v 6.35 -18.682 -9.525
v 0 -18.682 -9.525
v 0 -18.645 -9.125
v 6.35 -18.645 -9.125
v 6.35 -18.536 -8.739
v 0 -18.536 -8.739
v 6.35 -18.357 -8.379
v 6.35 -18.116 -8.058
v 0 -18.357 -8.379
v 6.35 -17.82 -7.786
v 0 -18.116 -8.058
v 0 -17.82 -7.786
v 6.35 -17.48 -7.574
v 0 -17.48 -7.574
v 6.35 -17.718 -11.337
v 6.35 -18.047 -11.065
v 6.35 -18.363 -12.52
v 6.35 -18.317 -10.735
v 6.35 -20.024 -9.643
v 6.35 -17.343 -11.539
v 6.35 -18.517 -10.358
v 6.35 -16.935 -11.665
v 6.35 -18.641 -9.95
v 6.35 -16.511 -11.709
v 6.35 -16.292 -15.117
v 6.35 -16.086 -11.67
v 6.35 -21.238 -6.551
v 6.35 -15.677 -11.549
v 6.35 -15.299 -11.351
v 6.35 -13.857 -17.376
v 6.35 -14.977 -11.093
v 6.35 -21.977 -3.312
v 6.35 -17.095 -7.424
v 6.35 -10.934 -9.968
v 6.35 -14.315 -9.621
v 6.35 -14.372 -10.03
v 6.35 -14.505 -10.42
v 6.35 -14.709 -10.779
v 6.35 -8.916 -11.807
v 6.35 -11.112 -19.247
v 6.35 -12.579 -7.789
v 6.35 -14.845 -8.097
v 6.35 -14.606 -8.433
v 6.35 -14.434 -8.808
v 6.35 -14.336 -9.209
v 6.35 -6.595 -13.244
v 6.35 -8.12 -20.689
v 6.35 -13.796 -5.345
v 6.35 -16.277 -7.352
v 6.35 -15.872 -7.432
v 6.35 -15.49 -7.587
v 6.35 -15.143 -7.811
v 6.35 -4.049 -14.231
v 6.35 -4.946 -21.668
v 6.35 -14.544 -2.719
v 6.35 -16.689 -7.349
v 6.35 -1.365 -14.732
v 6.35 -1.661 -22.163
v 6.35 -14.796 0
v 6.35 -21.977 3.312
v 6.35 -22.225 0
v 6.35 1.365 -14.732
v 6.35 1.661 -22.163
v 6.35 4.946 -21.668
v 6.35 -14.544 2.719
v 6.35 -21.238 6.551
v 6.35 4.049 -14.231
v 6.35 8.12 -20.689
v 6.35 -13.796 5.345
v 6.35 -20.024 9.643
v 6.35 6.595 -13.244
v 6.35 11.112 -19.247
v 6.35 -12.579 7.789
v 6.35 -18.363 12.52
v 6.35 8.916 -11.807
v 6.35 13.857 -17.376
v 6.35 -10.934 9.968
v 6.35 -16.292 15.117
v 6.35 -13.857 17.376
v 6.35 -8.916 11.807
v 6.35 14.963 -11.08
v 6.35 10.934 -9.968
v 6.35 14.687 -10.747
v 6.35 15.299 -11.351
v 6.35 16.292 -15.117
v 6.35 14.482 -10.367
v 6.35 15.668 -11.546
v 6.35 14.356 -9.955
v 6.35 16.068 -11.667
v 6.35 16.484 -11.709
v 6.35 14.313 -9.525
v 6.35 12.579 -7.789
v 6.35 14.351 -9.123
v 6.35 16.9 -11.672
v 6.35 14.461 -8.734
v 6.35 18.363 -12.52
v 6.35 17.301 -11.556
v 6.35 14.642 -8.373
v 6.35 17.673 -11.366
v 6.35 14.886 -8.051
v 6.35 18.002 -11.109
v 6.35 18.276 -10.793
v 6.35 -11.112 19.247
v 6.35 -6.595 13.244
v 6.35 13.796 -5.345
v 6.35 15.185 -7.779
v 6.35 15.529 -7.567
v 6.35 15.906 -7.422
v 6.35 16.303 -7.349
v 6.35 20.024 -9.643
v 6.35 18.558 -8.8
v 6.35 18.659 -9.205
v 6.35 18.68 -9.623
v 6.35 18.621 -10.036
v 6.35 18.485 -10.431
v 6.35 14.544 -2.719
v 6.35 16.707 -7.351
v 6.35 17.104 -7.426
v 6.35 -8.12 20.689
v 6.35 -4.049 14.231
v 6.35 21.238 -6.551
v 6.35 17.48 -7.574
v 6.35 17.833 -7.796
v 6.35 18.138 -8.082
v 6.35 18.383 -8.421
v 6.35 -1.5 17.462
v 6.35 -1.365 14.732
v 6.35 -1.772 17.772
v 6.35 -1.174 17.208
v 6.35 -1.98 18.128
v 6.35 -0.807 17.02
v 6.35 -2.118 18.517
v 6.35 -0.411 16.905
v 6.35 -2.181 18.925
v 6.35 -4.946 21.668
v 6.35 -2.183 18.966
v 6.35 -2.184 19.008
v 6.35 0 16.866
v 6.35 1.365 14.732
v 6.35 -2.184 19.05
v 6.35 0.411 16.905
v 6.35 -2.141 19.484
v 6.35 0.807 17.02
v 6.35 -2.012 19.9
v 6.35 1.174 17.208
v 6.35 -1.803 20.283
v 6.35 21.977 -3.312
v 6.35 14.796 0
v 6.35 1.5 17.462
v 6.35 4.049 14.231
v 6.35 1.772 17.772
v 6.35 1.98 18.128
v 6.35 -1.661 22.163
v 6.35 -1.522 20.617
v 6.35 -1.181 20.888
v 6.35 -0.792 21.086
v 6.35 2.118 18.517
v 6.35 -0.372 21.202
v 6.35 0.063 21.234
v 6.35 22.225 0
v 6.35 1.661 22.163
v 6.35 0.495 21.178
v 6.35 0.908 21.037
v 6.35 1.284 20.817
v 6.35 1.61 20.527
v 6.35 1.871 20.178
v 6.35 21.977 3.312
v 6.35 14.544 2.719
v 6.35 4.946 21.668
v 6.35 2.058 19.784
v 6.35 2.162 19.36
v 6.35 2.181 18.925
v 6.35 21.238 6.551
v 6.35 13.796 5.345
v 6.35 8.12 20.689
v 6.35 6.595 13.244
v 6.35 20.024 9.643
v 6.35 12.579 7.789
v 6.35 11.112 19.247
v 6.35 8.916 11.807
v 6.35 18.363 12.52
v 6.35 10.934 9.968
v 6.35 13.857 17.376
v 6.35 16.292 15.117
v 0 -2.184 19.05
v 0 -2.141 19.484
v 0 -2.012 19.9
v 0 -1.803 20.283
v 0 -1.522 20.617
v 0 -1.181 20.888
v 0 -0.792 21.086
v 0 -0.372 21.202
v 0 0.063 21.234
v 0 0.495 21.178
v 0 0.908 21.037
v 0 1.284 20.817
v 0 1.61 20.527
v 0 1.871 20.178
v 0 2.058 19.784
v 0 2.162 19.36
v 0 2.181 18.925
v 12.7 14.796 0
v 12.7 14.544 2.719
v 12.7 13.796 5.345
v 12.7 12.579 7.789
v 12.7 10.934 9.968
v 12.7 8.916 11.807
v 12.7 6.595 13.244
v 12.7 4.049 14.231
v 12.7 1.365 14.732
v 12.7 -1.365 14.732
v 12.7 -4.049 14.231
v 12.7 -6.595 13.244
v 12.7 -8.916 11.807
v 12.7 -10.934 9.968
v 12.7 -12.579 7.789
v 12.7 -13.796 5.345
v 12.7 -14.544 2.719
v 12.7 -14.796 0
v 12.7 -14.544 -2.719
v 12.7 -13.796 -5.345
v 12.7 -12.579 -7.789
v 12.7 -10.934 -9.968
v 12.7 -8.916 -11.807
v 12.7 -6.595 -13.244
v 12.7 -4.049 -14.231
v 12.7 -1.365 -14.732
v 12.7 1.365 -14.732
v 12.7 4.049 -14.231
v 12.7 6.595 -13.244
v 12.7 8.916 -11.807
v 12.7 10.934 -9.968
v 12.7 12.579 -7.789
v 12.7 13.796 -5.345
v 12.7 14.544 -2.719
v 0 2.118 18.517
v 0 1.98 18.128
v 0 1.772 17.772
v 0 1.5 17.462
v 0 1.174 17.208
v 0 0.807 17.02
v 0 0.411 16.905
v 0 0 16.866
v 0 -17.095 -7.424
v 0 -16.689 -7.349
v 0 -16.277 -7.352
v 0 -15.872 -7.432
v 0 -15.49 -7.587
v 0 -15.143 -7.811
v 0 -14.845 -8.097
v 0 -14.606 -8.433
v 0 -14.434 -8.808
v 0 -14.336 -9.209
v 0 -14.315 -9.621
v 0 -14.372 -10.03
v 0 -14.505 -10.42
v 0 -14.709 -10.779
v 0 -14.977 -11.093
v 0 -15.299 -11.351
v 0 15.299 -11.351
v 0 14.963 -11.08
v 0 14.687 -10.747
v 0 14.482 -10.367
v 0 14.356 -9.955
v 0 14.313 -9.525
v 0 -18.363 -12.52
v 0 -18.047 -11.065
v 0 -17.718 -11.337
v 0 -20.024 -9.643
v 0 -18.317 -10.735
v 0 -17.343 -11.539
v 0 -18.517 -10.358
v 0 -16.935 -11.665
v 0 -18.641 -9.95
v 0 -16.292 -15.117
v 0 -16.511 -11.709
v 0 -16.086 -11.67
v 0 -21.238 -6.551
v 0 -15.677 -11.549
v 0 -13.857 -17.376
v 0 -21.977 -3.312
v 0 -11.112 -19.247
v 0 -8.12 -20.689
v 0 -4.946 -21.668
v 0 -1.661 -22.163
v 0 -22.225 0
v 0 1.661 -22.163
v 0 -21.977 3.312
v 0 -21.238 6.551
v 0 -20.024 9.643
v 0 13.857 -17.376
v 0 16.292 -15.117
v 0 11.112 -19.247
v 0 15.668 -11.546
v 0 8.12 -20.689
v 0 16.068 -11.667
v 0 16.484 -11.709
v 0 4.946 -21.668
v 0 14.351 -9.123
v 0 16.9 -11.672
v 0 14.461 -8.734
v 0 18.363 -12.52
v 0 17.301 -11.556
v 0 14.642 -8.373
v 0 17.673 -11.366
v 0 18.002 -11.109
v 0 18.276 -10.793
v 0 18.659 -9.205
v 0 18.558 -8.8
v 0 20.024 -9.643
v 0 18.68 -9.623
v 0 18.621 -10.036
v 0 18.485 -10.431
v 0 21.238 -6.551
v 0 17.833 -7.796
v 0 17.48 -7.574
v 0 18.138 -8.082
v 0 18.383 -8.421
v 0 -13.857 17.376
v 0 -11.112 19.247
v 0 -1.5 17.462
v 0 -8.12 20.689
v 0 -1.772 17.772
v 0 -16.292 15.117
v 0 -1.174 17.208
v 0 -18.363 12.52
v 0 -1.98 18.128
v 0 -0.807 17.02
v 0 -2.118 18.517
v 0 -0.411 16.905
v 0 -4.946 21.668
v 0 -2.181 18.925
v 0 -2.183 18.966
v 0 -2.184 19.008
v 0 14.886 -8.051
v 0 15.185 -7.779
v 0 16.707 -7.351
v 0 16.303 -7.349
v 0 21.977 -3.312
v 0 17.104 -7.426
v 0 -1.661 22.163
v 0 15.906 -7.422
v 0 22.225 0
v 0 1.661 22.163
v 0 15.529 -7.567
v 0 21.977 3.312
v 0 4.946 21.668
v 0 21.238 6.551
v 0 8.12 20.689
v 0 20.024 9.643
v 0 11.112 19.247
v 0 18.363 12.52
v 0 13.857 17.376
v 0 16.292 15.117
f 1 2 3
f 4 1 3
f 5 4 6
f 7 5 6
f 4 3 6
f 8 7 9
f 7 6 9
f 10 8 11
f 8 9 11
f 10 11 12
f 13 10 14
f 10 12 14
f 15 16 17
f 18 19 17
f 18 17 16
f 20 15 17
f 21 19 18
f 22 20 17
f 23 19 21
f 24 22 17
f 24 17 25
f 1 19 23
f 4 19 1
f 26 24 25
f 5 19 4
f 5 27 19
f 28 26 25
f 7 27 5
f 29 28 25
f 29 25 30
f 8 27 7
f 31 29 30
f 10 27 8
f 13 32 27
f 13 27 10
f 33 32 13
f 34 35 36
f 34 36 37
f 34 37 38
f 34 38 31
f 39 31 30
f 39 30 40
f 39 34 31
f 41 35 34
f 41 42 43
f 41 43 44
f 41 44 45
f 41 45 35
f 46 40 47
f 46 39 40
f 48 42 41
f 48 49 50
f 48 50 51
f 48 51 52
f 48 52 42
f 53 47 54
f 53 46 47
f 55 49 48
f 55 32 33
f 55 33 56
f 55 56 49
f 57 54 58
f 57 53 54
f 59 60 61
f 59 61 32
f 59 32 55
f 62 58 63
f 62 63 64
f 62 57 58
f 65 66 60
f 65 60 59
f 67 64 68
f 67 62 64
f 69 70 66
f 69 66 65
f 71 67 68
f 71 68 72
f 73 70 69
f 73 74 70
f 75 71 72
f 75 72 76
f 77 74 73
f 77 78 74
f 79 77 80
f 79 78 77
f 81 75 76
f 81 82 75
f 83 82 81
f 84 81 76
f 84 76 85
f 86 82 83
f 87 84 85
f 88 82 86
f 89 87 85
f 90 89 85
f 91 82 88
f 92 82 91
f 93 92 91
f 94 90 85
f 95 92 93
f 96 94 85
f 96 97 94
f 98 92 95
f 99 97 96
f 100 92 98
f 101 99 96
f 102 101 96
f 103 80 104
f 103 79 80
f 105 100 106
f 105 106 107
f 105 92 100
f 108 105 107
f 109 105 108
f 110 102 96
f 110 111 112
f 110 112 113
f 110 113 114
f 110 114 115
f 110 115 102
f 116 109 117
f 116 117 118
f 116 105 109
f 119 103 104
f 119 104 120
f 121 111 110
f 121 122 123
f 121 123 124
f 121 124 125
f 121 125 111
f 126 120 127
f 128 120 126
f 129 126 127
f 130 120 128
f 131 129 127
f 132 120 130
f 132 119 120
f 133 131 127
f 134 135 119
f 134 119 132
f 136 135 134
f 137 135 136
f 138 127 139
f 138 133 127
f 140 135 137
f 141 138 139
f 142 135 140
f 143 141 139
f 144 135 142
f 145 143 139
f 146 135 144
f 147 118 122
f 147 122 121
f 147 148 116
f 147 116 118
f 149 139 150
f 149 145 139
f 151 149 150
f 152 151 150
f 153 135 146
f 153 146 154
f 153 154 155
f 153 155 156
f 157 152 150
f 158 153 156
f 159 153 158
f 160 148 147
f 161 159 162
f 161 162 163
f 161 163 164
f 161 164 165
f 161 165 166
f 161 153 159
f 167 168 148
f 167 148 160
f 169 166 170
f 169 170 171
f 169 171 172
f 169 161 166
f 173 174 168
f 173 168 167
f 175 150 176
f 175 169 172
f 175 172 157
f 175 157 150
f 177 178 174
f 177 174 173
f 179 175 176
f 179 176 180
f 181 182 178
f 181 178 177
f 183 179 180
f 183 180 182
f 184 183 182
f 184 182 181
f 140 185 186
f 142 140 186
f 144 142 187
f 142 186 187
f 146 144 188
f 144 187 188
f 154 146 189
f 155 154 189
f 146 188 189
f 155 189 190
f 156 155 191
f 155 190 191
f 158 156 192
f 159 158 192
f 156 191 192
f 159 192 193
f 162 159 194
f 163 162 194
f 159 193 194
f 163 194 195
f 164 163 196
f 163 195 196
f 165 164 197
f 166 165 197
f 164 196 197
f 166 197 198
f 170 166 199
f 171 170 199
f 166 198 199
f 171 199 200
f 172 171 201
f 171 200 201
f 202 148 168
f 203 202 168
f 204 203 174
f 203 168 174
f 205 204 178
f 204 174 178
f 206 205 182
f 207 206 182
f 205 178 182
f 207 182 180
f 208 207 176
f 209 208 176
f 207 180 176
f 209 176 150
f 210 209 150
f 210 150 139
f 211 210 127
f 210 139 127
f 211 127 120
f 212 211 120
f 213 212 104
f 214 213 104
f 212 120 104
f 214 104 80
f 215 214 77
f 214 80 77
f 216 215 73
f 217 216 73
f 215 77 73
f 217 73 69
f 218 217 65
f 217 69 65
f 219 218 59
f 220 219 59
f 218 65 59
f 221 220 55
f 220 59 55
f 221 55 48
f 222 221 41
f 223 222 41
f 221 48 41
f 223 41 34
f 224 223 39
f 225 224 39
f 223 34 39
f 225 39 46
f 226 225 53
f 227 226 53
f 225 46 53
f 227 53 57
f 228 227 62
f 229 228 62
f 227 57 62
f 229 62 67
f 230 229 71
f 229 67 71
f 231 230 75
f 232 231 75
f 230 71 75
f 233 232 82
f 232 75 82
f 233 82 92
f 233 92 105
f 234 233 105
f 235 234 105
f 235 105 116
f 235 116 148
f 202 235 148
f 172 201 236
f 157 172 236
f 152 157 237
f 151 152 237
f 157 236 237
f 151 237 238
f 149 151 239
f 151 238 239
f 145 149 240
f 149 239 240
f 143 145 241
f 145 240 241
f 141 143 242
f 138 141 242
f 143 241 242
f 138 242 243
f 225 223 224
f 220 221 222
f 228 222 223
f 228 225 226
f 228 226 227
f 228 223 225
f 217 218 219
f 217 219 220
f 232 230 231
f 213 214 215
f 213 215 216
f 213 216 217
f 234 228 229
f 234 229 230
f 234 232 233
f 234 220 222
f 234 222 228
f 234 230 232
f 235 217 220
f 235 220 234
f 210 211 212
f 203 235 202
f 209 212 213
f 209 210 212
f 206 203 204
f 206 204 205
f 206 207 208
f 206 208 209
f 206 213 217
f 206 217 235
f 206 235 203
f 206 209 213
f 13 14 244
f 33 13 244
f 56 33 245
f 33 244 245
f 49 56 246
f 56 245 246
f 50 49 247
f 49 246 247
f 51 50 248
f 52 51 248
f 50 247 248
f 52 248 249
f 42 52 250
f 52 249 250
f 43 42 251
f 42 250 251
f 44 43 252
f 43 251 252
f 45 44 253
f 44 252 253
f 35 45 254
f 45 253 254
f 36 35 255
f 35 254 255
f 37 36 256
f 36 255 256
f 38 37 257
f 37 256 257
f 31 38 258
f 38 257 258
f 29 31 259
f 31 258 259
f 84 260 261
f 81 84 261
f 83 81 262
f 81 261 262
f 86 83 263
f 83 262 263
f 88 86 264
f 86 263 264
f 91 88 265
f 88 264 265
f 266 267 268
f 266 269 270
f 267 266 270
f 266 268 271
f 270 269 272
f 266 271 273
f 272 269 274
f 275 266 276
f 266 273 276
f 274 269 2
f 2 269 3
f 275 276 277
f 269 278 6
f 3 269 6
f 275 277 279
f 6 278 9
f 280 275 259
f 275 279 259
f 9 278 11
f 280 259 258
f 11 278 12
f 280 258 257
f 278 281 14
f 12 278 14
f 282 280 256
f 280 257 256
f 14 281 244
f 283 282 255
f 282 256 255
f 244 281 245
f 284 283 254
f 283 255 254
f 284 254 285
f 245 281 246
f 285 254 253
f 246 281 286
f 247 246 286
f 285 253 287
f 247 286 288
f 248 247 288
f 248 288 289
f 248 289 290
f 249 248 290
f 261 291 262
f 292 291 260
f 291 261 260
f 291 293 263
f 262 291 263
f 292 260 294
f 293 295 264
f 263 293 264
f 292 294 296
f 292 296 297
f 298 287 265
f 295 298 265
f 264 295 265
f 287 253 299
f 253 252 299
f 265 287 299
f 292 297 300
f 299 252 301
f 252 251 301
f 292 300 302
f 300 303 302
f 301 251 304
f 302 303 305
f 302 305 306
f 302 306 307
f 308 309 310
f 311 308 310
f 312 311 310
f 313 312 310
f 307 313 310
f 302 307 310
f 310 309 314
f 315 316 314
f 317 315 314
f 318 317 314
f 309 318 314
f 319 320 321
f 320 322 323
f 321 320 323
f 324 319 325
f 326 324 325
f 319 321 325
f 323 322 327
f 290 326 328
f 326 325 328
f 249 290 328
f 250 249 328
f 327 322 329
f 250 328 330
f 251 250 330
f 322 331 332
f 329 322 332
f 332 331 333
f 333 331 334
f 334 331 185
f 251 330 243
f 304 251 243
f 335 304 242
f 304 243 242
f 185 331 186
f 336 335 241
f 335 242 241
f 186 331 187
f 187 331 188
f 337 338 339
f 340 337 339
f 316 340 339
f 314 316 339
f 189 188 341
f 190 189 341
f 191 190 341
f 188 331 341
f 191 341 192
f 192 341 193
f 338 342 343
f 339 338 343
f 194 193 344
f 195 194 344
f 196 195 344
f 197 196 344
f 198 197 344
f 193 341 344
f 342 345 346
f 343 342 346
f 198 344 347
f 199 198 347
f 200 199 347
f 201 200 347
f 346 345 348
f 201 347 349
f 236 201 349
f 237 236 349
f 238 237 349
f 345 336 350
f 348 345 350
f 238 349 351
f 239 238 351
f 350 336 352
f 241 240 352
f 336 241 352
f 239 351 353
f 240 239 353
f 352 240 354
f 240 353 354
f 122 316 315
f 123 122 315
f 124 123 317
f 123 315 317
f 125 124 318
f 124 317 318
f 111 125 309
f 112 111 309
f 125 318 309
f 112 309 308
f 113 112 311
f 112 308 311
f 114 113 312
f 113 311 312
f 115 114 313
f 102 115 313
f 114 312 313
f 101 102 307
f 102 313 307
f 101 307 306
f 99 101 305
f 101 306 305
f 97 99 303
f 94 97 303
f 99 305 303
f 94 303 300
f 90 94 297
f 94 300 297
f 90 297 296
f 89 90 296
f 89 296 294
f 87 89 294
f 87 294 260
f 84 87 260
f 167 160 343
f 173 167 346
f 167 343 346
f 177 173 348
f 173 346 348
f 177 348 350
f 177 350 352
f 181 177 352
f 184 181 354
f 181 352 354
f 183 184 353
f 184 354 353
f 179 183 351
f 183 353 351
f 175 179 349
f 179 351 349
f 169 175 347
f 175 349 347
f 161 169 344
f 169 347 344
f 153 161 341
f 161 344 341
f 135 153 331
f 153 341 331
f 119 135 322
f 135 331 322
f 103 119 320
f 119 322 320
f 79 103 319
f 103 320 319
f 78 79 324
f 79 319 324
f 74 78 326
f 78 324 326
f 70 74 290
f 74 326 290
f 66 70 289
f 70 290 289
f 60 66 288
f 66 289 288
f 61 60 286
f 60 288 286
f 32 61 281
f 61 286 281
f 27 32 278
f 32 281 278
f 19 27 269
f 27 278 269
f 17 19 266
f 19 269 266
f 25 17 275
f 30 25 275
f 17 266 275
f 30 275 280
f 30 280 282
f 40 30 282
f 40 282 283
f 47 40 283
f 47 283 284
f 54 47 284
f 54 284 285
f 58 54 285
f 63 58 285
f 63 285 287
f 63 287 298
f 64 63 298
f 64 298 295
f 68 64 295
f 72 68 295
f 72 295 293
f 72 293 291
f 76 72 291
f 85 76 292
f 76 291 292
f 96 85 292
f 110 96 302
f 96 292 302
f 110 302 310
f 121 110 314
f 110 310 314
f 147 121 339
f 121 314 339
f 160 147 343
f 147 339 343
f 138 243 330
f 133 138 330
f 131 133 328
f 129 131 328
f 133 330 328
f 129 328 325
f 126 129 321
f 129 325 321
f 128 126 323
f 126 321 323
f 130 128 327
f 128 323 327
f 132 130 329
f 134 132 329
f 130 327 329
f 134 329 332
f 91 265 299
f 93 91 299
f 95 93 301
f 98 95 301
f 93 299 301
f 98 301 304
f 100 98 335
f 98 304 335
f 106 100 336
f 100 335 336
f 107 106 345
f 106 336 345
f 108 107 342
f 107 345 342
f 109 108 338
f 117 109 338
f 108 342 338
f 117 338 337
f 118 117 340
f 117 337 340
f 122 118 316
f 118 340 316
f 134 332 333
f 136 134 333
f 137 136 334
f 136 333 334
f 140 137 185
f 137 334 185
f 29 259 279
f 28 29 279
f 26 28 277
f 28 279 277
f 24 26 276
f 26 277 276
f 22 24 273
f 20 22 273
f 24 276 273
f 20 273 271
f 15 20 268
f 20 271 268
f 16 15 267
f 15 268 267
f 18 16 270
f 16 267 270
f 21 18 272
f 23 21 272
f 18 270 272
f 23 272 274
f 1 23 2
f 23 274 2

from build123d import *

# Parameters (mm, degrees)
F0_R     = 22.225
F1_DEPTH = 6.35
F2_R     = 14.7955
F3_DEPTH = 6.35
F5_DEPTH = 25.4


with BuildPart() as f1:
    # F0 (on Right) → F1 (new body)
    with BuildSketch(Plane.YZ):
        Circle(F0_R)
    extrude(amount=F1_DEPTH)

    # F2 (on face) → F3 (join)
    with BuildSketch(Plane.YZ.offset(6.35)):
        Circle(F2_R)
    extrude(amount=F3_DEPTH)

    # F4 (on face) → F5 (cut)
    with BuildSketch(Plane(origin=(0, 0, 0), x_dir=(0, -1, 0), z_dir=(-1, 0, 0))):
        with BuildLine():
            ThreePointArc((-17.4797272753, -7.57374639), (-16.4977839421, -9.525), (-15.2989204133, -11.3510146766))
            ThreePointArc((-15.2989204133, -11.3510146766), (-14.5754935306, -10.5624984018), (-14.3133839421, -9.525))
            ThreePointArc((-14.3133839421, -9.525), (-15.3517808132, -7.6653548219), (-17.4797272753, -7.57374639))
        make_face()
        with BuildLine():
            ThreePointArc((-17.4797272753, -7.57374639), (-18.3895298341, -10.6172), (-15.2989204133, -11.3510146766))
            ThreePointArc((-15.2989204133, -11.3510146766), (-16.4977839421, -9.525), (-17.4797272753, -7.57374639))
        make_face()
        with BuildLine():
            ThreePointArc((15.2989204133, -11.3510146766), (16.4977839421, -9.525), (17.4797272753, -7.57374639))
            ThreePointArc((17.4797272753, -7.57374639), (14.6060380501, -8.4328), (15.2989204133, -11.3510146766))
        make_face()
        with BuildLine():
            ThreePointArc((18.6821839421, -9.525), (18.3574291202, -8.3789968711), (17.4797272753, -7.57374639))
            ThreePointArc((17.4797272753, -7.57374639), (16.4977839421, -9.525), (15.2989204133, -11.3510146766))
            ThreePointArc((15.2989204133, -11.3510146766), (17.5352823439, -11.4472904115), (18.6821839421, -9.525))
        make_face()
        with BuildLine():
            ThreePointArc((0, 19.05), (1.0922, 19.0186644946), (2.1808068621, 18.9247610667))
            ThreePointArc((2.1808068621, 18.9247610667), (2.1835015307, 18.9873547666), (2.1844, 19.05))
            ThreePointArc((2.1844, 19.05), (-0.0626452334, 21.2335015307), (-2.1808068621, 18.9247610667))
            ThreePointArc((-2.1808068621, 18.9247610667), (-1.0922, 19.0186644946), (0, 19.05))
        make_face()
        with BuildLine():
            ThreePointArc((0, 16.8656), (1.4996718698, 17.4617343915), (2.1808068621, 18.9247610667))
            ThreePointArc((2.1808068621, 18.9247610667), (1.0922, 19.0186644946), (0, 19.05))
            Line((0, 19.05), (0, 16.8656))
        make_face()
        with BuildLine():
            Line((0, 16.8656), (0, 19.05))
            ThreePointArc((0, 19.05), (-1.0922, 19.0186644946), (-2.1808068621, 18.9247610667))
            ThreePointArc((-2.1808068621, 18.9247610667), (-1.4996718698, 17.4617343915), (0, 16.8656))
        make_face()
    extrude(amount=-F5_DEPTH, mode=Mode.SUBTRACT)


solid = f1.part
